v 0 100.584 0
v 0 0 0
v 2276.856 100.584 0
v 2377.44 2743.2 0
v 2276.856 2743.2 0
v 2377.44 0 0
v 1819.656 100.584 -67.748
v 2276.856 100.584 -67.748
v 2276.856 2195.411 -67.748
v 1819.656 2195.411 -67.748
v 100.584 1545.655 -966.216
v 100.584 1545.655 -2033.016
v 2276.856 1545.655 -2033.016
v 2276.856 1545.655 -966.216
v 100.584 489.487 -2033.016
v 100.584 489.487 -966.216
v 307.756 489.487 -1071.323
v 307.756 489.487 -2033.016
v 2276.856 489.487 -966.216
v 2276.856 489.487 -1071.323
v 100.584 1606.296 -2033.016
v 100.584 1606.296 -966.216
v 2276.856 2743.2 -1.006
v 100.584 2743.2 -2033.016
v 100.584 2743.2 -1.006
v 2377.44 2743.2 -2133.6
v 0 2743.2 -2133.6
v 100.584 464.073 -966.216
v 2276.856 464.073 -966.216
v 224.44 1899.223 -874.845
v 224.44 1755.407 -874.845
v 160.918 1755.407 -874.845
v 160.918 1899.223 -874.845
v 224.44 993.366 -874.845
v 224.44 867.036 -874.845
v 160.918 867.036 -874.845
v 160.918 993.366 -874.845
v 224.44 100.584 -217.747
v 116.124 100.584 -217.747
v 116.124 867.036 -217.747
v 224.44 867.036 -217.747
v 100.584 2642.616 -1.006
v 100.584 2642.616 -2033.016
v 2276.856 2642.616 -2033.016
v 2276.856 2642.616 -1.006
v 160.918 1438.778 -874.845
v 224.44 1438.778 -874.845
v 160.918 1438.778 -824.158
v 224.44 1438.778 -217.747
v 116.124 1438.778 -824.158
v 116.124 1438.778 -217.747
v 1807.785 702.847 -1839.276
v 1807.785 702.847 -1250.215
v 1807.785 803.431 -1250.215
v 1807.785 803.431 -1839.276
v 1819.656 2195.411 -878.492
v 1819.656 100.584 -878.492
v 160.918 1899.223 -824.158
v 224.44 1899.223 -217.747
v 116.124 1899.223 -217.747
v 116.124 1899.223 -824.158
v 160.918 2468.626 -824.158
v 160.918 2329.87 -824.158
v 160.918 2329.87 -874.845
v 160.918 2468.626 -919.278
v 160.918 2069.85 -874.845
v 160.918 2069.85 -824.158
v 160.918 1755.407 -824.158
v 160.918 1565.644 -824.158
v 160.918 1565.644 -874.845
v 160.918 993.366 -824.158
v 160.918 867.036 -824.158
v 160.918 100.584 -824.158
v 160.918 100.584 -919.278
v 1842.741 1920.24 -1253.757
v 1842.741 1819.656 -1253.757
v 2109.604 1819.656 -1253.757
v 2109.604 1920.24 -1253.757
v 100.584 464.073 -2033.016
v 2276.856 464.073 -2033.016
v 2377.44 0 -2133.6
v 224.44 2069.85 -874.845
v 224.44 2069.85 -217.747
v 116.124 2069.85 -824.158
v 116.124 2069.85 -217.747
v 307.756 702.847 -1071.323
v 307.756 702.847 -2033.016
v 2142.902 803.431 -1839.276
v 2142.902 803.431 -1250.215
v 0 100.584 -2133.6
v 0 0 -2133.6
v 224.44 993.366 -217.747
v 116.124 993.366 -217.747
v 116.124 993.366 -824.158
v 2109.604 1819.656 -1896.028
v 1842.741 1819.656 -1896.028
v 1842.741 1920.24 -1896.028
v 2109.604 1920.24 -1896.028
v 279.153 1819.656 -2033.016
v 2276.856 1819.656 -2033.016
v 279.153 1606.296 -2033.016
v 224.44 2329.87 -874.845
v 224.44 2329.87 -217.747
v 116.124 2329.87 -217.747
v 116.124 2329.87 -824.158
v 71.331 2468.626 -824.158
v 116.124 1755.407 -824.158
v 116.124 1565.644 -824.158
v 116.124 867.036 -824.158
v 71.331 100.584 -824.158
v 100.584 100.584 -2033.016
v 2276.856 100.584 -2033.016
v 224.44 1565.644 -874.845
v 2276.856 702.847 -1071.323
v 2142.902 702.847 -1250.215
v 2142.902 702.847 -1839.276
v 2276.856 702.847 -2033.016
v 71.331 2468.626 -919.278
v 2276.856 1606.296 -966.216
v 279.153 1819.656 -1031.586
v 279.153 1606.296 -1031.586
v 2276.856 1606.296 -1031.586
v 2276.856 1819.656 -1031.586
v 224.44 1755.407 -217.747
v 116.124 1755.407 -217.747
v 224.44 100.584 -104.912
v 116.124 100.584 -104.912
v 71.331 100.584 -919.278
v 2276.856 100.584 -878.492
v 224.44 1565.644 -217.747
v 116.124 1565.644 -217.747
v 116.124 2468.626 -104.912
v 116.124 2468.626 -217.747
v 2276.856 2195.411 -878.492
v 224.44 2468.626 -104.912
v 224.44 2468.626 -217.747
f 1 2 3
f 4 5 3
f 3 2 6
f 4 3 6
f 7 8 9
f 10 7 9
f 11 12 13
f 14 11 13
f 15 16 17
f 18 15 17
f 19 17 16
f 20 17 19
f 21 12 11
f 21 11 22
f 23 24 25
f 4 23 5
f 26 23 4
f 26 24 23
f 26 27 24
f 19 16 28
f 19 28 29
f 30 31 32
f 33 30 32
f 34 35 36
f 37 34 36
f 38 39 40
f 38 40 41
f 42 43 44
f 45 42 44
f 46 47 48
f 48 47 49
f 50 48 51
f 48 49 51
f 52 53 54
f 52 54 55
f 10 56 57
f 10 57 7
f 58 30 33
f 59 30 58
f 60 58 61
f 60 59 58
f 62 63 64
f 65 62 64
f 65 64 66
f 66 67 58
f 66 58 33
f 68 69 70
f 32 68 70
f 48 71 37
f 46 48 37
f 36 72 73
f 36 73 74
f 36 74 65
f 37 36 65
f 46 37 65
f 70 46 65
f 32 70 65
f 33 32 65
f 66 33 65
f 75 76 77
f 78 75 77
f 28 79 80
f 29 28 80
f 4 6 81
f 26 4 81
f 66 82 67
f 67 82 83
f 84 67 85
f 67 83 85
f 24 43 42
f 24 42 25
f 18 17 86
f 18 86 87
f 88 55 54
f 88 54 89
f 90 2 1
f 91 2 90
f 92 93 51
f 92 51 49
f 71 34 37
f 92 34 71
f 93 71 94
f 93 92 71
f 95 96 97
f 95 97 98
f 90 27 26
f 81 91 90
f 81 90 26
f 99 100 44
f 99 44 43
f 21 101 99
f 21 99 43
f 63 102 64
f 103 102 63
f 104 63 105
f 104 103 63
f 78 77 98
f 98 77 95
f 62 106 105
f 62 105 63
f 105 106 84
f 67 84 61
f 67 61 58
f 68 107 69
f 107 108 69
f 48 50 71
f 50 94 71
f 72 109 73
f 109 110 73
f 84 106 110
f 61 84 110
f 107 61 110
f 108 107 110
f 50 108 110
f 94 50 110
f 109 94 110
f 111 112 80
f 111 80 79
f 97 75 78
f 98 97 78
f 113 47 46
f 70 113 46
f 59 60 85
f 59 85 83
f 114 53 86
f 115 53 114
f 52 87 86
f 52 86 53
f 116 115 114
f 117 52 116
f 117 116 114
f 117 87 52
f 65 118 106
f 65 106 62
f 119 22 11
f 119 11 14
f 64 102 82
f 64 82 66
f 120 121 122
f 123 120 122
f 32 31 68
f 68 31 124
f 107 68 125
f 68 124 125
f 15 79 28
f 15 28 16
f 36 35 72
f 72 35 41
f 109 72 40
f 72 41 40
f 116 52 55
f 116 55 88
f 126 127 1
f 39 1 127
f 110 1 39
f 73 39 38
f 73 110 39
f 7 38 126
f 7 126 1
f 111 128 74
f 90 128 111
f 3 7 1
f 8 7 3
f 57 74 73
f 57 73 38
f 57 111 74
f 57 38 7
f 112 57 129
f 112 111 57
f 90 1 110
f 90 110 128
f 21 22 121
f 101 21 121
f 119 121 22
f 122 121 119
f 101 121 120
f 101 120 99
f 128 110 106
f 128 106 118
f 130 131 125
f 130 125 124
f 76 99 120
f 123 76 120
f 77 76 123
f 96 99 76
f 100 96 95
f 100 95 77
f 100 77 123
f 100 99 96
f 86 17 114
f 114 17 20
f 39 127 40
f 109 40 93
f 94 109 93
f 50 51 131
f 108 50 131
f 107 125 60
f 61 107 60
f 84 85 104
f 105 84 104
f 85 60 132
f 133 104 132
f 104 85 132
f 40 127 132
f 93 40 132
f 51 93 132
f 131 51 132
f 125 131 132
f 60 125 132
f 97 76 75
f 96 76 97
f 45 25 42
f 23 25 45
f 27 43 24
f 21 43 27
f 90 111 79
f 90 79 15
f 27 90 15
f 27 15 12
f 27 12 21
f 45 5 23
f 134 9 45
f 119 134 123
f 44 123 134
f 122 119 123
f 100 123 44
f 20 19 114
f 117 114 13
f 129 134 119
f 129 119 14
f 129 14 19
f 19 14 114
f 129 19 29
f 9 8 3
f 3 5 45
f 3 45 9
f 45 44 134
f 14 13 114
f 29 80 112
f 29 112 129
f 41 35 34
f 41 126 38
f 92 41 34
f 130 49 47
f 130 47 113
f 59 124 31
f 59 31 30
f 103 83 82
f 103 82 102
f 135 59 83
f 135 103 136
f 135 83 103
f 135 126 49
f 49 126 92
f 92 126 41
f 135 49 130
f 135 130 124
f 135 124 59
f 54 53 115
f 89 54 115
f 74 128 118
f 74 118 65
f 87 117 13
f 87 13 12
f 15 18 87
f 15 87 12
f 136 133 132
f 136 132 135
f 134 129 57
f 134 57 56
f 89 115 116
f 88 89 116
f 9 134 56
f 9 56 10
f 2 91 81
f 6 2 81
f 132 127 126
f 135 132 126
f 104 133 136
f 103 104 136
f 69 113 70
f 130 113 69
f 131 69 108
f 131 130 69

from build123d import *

# Parameters (mm, degrees)
SKETCH1_W            = 2377.44
SKETCH1_H            = 2133.6
BOSS_EXTRUDE1_DEPTH  = 100.584
BOSS_EXTRUDE2_DEPTH  = 2743.2
SKETCH3_W            = 2176.272
SKETCH3_H            = 100.584
BOSS_EXTRUDE3_DEPTH  = 2032.01016
SKETCH4_W            = 2176.272
SKETCH4_H            = 25.414103574
SKETCH4_H_2          = 60.640608873
BOSS_EXTRUDE4_DEPTH  = 1066.8
SKETCH5_W            = 810.743905069
SKETCH5_H            = 2094.827359662
BOSS_EXTRUDE5_DEPTH  = 457.2
SKETCH6_W            = 1997.703421867
SKETCH6_H            = 1001.430219192
BOSS_EXTRUDE6_DEPTH  = 213.36
SKETCH7_W            = 1969.099770792
SKETCH7_H            = 961.692694148
BOSS_EXTRUDE7_DEPTH  = 213.36
SKETCH8_W            = 266.86255044
SKETCH8_H            = 642.270503211
BOSS_EXTRUDE8_DEPTH  = 100.584
SKETCH9_W            = 335.117143437
SKETCH9_H            = 589.061250779
BOSS_EXTRUDE9_DEPTH  = 100.584
SKETCH10_W           = 89.586922485
SKETCH10_H           = 95.120149651
SKETCH10_W_2         = 108.315606024
SKETCH10_H_2         = 112.834603223
BOSS_EXTRUDE10_DEPTH = 2368.042
SKETCH11_W           = 108.315606024
SKETCH11_H           = 126.330231555
SKETCH11_H_2         = 126.865564389
SKETCH11_H_3         = 143.81666183
SKETCH11_H_4         = 260.020873713
BOSS_EXTRUDE11_DEPTH = 657.098


with BuildPart() as part:
    # Sketch1 → Boss-Extrude1 (new body)
    with BuildSketch(Plane(origin=(0, 0, 0), x_dir=(1, 0, 0), z_dir=(0, 1, 0))):
        with Locations((1188.72, 1066.8)):
            Rectangle(SKETCH1_W, SKETCH1_H)
    extrude(amount=BOSS_EXTRUDE1_DEPTH)

    # Sketch2 → Boss-Extrude2 (add)
    with BuildSketch(Plane(origin=(0, 0, 0), x_dir=(1, 0, 0), z_dir=(0, 1, 0))):
        Polygon((0, 2133.6), (100.584, 2133.6), (2377.44, 2133.6), (2377.44, 2033.016), (2377.44, 0), (2276.856, 0), (2276.856, 2033.016), (100.584, 2033.016), align=None)
    extrude(amount=BOSS_EXTRUDE2_DEPTH)

    # Sketch3 → Boss-Extrude3 (add)
    with BuildSketch(Plane.XY.offset(-2033.016)):
        with Locations((1188.72, 2692.908)):
            Rectangle(SKETCH3_W, SKETCH3_H)
    extrude(amount=BOSS_EXTRUDE3_DEPTH)

    # Sketch4 → Boss-Extrude4 (add)
    with BuildSketch(Plane.XY.offset(-2033.016)):
        with Locations((1188.72, 476.779733843)):
            Rectangle(SKETCH4_W, SKETCH4_H)
        with Locations((1188.72, 1575.975695564)):
            Rectangle(SKETCH4_W, SKETCH4_H_2)
    extrude(amount=BOSS_EXTRUDE4_DEPTH)

    # Sketch5 → Boss-Extrude5 (add)
    with BuildSketch(Plane.ZY.offset(-2276.856)):
        with Locations((-473.120217172, 1147.997679831)):
            Rectangle(SKETCH5_W, SKETCH5_H)
    extrude(amount=BOSS_EXTRUDE5_DEPTH)

    # Sketch6 → Boss-Extrude6 (add)
    with BuildSketch(Plane(origin=(0, 1606.296, 0), x_dir=(1, 0, 0), z_dir=(0, 1, 0))):
        with Locations((1278.004289067, 1532.300890404)):
            Rectangle(SKETCH6_W, SKETCH6_H)
    extrude(amount=BOSS_EXTRUDE6_DEPTH)

    # Sketch7 → Boss-Extrude7 (add)
    with BuildSketch(Plane(origin=(0, 489.48678563, 0), x_dir=(1, 0, 0), z_dir=(0, 1, 0))):
        with Locations((1292.306114604, 1552.169652926)):
            Rectangle(SKETCH7_W, SKETCH7_H)
    extrude(amount=BOSS_EXTRUDE7_DEPTH)

    # Sketch8 → Boss-Extrude8 (add)
    with BuildSketch(Plane(origin=(0, 1819.656, 0), x_dir=(1, 0, 0), z_dir=(0, 1, 0))):
        with Locations((1976.172529311, 1574.892629599)):
            Rectangle(SKETCH8_W, SKETCH8_H)
    extrude(amount=BOSS_EXTRUDE8_DEPTH)

    # Sketch9 → Boss-Extrude9 (add)
    with BuildSketch(Plane(origin=(0, 702.84678563, 0), x_dir=(1, 0, 0), z_dir=(0, 1, 0))):
        with Locations((1975.343586519, 1544.745806452)):
            Rectangle(SKETCH9_W, SKETCH9_H)
    extrude(amount=BOSS_EXTRUDE9_DEPTH)

    # Sketch10 → Boss-Extrude10 (add)
    with BuildSketch(Plane(origin=(0, 100.584, 0), x_dir=(1, 0, 0), z_dir=(0, 1, 0))):
        with Locations((116.124300093, 871.717601268)):
            Rectangle(SKETCH10_W, SKETCH10_H)
        with Locations((170.282103105, 161.329423399)):
            Rectangle(SKETCH10_W_2, SKETCH10_H_2)
    extrude(amount=BOSS_EXTRUDE10_DEPTH)

    # Sketch11 → Boss-Extrude11 (add)
    with BuildSketch(Plane(origin=(0, 0, -217.74672501), x_dir=(-1, 0, 0), z_dir=(0, 0, -1))):
        with Locations((-170.282103105, 930.200863925)):
            Rectangle(SKETCH11_W, SKETCH11_H)
        with Locations((-170.282103105, 1502.211041792)):
            Rectangle(SKETCH11_W, SKETCH11_H_2)
        with Locations((-170.282103105, 1827.31516865)):
            Rectangle(SKETCH11_W, SKETCH11_H_3)
        with Locations((-170.282103105, 2199.860048946)):
            Rectangle(SKETCH11_W, SKETCH11_H_4)
    extrude(amount=BOSS_EXTRUDE11_DEPTH)


solid = part.part
